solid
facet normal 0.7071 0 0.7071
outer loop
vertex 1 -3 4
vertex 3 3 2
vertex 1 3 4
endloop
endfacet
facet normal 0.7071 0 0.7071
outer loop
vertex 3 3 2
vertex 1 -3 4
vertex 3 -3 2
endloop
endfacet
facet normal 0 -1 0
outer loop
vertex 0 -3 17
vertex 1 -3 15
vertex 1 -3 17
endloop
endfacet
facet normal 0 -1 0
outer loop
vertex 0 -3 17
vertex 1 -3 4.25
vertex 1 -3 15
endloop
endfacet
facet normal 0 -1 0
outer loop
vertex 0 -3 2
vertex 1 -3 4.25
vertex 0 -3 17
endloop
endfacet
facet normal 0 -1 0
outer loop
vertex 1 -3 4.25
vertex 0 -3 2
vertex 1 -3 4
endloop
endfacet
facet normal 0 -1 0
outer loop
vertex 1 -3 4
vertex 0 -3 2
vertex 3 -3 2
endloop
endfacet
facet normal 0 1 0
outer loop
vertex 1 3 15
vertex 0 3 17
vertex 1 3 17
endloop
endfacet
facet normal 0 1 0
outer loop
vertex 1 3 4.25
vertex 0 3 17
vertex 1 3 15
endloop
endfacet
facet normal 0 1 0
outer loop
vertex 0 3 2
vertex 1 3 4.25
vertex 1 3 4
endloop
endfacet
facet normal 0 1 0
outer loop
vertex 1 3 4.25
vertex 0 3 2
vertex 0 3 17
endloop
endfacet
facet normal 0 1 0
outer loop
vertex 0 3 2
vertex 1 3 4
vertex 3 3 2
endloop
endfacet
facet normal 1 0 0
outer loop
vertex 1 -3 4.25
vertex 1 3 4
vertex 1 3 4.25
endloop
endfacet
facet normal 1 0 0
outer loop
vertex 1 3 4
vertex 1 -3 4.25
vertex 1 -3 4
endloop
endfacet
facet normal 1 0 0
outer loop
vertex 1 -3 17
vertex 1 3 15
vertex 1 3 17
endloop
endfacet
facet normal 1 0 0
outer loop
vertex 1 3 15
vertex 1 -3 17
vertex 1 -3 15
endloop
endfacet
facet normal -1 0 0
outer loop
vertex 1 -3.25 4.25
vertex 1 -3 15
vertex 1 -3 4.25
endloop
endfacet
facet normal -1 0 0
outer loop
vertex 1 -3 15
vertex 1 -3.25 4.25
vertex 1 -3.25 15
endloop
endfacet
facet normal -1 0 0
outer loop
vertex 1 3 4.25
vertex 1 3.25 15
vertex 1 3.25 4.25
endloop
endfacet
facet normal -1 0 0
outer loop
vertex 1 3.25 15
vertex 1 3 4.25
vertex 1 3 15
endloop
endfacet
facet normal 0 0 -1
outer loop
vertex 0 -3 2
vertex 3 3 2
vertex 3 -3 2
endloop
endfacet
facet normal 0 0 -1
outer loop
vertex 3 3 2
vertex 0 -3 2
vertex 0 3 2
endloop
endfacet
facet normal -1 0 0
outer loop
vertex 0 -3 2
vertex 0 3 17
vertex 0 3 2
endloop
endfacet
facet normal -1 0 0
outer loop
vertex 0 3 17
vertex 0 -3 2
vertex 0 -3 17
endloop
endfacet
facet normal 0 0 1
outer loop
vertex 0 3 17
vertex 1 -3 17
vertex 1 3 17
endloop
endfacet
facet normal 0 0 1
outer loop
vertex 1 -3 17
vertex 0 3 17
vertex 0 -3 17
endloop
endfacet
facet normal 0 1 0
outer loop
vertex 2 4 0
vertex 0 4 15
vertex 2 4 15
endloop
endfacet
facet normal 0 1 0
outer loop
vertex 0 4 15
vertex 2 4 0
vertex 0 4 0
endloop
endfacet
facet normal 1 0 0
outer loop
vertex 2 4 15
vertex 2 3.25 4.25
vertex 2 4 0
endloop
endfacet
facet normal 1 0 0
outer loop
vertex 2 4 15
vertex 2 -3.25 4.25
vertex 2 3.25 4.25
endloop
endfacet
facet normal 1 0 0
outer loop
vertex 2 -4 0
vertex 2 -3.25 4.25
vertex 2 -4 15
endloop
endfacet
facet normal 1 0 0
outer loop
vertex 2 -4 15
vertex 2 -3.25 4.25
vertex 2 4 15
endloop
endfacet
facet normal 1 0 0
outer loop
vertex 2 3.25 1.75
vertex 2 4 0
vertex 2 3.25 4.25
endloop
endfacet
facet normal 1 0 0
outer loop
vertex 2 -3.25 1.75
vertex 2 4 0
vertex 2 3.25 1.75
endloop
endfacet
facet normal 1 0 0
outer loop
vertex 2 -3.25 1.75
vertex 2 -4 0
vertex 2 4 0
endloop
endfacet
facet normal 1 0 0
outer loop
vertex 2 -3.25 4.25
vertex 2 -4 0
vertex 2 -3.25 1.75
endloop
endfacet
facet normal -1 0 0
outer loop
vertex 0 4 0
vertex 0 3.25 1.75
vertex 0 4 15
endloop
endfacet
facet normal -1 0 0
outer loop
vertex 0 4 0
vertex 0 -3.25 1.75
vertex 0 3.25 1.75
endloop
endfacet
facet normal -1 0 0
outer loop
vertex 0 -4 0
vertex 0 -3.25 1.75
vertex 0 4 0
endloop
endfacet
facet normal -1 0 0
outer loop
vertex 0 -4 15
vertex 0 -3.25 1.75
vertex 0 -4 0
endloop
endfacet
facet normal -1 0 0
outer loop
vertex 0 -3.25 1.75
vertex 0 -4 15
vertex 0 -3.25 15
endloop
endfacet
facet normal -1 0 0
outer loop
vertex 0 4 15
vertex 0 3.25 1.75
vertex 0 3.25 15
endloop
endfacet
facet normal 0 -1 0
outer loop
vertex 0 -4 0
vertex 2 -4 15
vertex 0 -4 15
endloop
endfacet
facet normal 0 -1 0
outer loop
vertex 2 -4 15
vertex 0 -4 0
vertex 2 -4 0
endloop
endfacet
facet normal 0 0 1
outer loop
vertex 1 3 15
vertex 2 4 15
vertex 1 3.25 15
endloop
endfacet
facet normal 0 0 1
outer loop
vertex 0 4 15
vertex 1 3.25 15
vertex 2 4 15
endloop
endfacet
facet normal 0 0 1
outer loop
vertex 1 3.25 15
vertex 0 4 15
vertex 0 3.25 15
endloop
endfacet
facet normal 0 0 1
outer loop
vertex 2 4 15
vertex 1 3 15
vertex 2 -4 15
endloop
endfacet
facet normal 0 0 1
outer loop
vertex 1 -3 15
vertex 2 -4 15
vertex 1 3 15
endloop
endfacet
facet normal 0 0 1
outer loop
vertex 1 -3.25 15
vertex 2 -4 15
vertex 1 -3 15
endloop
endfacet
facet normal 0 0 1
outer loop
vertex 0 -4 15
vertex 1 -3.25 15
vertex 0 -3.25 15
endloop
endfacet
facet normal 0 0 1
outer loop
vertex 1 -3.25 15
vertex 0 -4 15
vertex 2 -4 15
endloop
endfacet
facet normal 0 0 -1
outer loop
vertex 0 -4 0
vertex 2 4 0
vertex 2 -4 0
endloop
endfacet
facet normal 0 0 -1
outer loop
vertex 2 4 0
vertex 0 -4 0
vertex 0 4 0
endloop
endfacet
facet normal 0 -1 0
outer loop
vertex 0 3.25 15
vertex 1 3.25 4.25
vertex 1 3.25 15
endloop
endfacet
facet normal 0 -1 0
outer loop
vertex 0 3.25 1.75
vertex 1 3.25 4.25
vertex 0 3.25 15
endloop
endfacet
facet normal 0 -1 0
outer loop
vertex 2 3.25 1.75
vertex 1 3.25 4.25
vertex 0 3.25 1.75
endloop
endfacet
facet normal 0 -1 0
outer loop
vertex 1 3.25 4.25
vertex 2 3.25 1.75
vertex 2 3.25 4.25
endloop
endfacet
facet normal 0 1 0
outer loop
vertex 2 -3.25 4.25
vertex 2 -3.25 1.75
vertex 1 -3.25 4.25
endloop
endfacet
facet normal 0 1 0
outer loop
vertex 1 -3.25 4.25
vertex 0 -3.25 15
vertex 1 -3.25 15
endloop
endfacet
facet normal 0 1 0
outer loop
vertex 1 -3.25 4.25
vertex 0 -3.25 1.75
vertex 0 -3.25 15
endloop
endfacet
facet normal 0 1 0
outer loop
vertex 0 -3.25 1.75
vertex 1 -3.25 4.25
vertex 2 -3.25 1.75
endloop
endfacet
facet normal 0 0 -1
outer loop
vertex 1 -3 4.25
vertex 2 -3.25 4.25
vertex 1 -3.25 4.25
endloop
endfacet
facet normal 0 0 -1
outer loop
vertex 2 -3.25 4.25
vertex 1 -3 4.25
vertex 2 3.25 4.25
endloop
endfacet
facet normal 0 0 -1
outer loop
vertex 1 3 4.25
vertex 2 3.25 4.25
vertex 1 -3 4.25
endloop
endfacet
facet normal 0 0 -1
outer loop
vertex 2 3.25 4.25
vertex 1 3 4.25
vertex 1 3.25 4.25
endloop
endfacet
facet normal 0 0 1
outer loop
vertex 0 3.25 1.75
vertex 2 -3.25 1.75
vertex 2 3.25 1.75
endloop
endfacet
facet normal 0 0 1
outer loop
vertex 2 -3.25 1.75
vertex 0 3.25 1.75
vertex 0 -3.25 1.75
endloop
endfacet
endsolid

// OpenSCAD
// Latches

module inner_latch(width=8,depth=2.5,height=5){
    difference(){
        cube([width,depth,height]);
        translate([0,0,1]){
            cube([width,depth-1,2.0]);
        }
        snap_lip(width=width, depth=depth, height=1.0);
    }
}

module inner_snap_lip(width=8,depth=3.0,height=2.0,x=0,y=0,z=0){

    points = [[0,0,0], [width,0,0], [width,depth,0],[0,depth,0],
                        [0,0,height],
                        [width,0,height]];
    
    faces = [[0,1,2,3],
                    [3,4,5,2],
                    [0,3,4],
                    [1,2,5],
                    [0,4,5,1]
    ];

    translate([x,y,z]){        
        hull(){
            polyhedron( points=points, faces=faces, convexity=1);
        }
    }
    
    translate([0,0,-.75]){
        cube([width,3,1.5]);
    }
}

module outer_snap(width=8,depth=2.0,height=2.0,x=0,y=0,z=0){

    points = [[0,0,0], [width,0,0], [width,depth,0],[0,depth,0],
                        [0,0,height],
                        [width,0,height]];
    
    faces = [[0,1,2,3],
                    [3,4,5,2],
                    [0,3,4],
                    [1,2,5],
                    [0,4,5,1]
    ];

    translate([x,y,z]){        
        hull(){
            polyhedron( points=points, faces=faces, convexity=1);
        }
    }
    
    translate([0,0,-1]){
        cube([width,15,1.0]);
    }
}



//translate([0,3,-2]){
//inner_latch();
//}
//inner_snap_lip();

module outer_latch_and_snap(x=0,y=0,z=0){
    translate([x,y,z]){
        translate([-10,-4,-10]){
            rotate([90,0,90]){
                translate([1,12,11]){
                    outer_snap(width=6);
                }
                translate([0,10,10]){
                    difference(){
                        cube([8,15,2]);
                        translate([.75,1.75,0]){
                            cube([6.5, 2.5,2]);
                        }
                       translate([.75,4,0]){
                            cube([6.5,11,1]);
                        }
                    }
                }
            }
        }
    }
}

outer_latch_and_snap();
